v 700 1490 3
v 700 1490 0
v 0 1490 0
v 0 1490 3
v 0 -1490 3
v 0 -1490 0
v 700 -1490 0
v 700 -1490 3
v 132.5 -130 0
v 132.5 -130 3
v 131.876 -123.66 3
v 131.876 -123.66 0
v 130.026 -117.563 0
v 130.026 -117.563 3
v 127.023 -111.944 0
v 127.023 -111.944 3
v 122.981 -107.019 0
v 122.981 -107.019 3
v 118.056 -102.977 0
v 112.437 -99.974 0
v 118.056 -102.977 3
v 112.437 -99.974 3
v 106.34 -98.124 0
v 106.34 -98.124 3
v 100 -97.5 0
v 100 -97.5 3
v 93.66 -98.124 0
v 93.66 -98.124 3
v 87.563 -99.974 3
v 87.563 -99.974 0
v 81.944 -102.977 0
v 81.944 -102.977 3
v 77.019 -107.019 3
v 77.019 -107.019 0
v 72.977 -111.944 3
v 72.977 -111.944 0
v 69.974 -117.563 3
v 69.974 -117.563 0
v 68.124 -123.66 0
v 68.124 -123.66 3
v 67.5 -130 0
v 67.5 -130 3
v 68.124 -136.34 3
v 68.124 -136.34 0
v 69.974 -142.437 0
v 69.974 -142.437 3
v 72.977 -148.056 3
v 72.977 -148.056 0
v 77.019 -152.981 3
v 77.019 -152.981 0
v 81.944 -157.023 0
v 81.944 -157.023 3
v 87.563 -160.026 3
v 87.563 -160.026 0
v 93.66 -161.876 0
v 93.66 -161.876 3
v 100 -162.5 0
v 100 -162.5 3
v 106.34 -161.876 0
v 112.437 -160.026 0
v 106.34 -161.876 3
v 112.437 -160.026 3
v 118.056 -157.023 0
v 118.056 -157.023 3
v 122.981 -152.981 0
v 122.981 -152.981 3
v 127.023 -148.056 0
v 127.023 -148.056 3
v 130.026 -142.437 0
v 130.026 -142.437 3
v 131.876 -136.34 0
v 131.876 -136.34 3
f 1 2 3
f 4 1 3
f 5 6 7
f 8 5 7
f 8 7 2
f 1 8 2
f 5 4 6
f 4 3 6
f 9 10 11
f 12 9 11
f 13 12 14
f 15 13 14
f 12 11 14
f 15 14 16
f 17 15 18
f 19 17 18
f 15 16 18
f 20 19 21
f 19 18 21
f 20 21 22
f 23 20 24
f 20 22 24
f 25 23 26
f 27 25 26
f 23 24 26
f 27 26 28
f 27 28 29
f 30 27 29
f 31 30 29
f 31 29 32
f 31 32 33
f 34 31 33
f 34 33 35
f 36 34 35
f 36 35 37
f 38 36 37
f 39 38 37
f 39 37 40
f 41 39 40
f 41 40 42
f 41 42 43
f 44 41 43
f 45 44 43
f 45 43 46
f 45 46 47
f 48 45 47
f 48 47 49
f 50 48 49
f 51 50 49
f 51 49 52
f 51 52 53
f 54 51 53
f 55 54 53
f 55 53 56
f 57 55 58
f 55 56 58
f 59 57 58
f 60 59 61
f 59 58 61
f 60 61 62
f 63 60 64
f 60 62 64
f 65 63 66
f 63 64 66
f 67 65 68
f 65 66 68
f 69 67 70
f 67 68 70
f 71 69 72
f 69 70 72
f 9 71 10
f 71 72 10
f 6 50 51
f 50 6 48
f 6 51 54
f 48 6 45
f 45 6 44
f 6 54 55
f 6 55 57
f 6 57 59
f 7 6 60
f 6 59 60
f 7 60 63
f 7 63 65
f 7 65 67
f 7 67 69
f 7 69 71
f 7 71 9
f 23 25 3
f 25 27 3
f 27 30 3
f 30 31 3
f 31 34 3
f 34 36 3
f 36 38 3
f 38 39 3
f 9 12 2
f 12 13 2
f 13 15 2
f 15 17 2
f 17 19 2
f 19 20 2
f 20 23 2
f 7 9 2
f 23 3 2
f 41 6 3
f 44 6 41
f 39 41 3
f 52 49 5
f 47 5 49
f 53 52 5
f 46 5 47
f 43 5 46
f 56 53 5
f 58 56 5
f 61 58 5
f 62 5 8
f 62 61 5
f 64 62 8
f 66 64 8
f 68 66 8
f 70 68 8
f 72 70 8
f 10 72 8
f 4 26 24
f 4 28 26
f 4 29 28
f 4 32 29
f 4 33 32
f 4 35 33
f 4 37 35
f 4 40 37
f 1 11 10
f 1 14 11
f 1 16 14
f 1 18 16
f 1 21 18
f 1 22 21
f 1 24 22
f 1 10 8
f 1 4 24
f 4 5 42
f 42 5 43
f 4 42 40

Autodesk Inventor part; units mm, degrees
ref_plane "YZ Plane" through (0, 0, 0) normal (1, 0, 0) x (0, 1, 0)
ref_plane "XZ Plane" through (0, 0, 0) normal (0, 1, 0) x (-1, 0, 0)
ref_plane "XY Plane" through (0, 0, 0) normal (0, 0, 1) x (1, 0, 0)
sketch "Sketch1" plane through (0, 0, 0) normal (0, 0, 1) x (1, 0, 0)
  line L0 (0, -1490) -> (700, -1490)
  line L1 (700, -1490) -> (700, 1490)
  line L2 (700, 1490) -> (0, 1490)
  line L3 (0, 1490) -> (0, -1490)
  point P0 (0, 0)
  point P1 (0, 0)
  dimension "d0" = 700
  dimension "d1" = 2980
extrude "Plate1" add sketch "Sketch1" along normal blind 3
sketch "Sketch6" plane through (0, 0, 3) normal (0, 0, 1) x (1, 0, 0)
  circle A0 centre (100, -130) radius 32.5
  line L0 (0, 1490) -> (700, 1490) projected
  line L1 (700, 1490) -> (700, -1490) projected
  line L2 (0, -1490) -> (0, 1490) projected
  point P0 (0, 0)
  point P1 (0, 0)
  dimension "d36" = 65
  dimension "d37" = 1620
  dimension "d41" = 100
extrude "Extrusion2" cut sketch "Sketch6" against normal up to surface (3 mm away)
equation "\"d2\" = Thickness"
equation "\"BendReliefWidth\" = Thickness"
equation "\"BendReliefDepth\" = 0.5 * Thickness"
equation "\"CornerReliefSize\" = 4 * Thickness"
equation "\"MinimumRemnant\" = 2 * Thickness"
equation "\"TransitionRadius\" = BendRadius"
equation "\"JacobiRadiusSize\" = BendRadius"
equation "\"GapSize\" = Thickness"
equation "\"Thickness\" = 3"
equation "\"BendRadius\" = 5"
properties part number "BSH 051 sheet in" material "09g2s"
